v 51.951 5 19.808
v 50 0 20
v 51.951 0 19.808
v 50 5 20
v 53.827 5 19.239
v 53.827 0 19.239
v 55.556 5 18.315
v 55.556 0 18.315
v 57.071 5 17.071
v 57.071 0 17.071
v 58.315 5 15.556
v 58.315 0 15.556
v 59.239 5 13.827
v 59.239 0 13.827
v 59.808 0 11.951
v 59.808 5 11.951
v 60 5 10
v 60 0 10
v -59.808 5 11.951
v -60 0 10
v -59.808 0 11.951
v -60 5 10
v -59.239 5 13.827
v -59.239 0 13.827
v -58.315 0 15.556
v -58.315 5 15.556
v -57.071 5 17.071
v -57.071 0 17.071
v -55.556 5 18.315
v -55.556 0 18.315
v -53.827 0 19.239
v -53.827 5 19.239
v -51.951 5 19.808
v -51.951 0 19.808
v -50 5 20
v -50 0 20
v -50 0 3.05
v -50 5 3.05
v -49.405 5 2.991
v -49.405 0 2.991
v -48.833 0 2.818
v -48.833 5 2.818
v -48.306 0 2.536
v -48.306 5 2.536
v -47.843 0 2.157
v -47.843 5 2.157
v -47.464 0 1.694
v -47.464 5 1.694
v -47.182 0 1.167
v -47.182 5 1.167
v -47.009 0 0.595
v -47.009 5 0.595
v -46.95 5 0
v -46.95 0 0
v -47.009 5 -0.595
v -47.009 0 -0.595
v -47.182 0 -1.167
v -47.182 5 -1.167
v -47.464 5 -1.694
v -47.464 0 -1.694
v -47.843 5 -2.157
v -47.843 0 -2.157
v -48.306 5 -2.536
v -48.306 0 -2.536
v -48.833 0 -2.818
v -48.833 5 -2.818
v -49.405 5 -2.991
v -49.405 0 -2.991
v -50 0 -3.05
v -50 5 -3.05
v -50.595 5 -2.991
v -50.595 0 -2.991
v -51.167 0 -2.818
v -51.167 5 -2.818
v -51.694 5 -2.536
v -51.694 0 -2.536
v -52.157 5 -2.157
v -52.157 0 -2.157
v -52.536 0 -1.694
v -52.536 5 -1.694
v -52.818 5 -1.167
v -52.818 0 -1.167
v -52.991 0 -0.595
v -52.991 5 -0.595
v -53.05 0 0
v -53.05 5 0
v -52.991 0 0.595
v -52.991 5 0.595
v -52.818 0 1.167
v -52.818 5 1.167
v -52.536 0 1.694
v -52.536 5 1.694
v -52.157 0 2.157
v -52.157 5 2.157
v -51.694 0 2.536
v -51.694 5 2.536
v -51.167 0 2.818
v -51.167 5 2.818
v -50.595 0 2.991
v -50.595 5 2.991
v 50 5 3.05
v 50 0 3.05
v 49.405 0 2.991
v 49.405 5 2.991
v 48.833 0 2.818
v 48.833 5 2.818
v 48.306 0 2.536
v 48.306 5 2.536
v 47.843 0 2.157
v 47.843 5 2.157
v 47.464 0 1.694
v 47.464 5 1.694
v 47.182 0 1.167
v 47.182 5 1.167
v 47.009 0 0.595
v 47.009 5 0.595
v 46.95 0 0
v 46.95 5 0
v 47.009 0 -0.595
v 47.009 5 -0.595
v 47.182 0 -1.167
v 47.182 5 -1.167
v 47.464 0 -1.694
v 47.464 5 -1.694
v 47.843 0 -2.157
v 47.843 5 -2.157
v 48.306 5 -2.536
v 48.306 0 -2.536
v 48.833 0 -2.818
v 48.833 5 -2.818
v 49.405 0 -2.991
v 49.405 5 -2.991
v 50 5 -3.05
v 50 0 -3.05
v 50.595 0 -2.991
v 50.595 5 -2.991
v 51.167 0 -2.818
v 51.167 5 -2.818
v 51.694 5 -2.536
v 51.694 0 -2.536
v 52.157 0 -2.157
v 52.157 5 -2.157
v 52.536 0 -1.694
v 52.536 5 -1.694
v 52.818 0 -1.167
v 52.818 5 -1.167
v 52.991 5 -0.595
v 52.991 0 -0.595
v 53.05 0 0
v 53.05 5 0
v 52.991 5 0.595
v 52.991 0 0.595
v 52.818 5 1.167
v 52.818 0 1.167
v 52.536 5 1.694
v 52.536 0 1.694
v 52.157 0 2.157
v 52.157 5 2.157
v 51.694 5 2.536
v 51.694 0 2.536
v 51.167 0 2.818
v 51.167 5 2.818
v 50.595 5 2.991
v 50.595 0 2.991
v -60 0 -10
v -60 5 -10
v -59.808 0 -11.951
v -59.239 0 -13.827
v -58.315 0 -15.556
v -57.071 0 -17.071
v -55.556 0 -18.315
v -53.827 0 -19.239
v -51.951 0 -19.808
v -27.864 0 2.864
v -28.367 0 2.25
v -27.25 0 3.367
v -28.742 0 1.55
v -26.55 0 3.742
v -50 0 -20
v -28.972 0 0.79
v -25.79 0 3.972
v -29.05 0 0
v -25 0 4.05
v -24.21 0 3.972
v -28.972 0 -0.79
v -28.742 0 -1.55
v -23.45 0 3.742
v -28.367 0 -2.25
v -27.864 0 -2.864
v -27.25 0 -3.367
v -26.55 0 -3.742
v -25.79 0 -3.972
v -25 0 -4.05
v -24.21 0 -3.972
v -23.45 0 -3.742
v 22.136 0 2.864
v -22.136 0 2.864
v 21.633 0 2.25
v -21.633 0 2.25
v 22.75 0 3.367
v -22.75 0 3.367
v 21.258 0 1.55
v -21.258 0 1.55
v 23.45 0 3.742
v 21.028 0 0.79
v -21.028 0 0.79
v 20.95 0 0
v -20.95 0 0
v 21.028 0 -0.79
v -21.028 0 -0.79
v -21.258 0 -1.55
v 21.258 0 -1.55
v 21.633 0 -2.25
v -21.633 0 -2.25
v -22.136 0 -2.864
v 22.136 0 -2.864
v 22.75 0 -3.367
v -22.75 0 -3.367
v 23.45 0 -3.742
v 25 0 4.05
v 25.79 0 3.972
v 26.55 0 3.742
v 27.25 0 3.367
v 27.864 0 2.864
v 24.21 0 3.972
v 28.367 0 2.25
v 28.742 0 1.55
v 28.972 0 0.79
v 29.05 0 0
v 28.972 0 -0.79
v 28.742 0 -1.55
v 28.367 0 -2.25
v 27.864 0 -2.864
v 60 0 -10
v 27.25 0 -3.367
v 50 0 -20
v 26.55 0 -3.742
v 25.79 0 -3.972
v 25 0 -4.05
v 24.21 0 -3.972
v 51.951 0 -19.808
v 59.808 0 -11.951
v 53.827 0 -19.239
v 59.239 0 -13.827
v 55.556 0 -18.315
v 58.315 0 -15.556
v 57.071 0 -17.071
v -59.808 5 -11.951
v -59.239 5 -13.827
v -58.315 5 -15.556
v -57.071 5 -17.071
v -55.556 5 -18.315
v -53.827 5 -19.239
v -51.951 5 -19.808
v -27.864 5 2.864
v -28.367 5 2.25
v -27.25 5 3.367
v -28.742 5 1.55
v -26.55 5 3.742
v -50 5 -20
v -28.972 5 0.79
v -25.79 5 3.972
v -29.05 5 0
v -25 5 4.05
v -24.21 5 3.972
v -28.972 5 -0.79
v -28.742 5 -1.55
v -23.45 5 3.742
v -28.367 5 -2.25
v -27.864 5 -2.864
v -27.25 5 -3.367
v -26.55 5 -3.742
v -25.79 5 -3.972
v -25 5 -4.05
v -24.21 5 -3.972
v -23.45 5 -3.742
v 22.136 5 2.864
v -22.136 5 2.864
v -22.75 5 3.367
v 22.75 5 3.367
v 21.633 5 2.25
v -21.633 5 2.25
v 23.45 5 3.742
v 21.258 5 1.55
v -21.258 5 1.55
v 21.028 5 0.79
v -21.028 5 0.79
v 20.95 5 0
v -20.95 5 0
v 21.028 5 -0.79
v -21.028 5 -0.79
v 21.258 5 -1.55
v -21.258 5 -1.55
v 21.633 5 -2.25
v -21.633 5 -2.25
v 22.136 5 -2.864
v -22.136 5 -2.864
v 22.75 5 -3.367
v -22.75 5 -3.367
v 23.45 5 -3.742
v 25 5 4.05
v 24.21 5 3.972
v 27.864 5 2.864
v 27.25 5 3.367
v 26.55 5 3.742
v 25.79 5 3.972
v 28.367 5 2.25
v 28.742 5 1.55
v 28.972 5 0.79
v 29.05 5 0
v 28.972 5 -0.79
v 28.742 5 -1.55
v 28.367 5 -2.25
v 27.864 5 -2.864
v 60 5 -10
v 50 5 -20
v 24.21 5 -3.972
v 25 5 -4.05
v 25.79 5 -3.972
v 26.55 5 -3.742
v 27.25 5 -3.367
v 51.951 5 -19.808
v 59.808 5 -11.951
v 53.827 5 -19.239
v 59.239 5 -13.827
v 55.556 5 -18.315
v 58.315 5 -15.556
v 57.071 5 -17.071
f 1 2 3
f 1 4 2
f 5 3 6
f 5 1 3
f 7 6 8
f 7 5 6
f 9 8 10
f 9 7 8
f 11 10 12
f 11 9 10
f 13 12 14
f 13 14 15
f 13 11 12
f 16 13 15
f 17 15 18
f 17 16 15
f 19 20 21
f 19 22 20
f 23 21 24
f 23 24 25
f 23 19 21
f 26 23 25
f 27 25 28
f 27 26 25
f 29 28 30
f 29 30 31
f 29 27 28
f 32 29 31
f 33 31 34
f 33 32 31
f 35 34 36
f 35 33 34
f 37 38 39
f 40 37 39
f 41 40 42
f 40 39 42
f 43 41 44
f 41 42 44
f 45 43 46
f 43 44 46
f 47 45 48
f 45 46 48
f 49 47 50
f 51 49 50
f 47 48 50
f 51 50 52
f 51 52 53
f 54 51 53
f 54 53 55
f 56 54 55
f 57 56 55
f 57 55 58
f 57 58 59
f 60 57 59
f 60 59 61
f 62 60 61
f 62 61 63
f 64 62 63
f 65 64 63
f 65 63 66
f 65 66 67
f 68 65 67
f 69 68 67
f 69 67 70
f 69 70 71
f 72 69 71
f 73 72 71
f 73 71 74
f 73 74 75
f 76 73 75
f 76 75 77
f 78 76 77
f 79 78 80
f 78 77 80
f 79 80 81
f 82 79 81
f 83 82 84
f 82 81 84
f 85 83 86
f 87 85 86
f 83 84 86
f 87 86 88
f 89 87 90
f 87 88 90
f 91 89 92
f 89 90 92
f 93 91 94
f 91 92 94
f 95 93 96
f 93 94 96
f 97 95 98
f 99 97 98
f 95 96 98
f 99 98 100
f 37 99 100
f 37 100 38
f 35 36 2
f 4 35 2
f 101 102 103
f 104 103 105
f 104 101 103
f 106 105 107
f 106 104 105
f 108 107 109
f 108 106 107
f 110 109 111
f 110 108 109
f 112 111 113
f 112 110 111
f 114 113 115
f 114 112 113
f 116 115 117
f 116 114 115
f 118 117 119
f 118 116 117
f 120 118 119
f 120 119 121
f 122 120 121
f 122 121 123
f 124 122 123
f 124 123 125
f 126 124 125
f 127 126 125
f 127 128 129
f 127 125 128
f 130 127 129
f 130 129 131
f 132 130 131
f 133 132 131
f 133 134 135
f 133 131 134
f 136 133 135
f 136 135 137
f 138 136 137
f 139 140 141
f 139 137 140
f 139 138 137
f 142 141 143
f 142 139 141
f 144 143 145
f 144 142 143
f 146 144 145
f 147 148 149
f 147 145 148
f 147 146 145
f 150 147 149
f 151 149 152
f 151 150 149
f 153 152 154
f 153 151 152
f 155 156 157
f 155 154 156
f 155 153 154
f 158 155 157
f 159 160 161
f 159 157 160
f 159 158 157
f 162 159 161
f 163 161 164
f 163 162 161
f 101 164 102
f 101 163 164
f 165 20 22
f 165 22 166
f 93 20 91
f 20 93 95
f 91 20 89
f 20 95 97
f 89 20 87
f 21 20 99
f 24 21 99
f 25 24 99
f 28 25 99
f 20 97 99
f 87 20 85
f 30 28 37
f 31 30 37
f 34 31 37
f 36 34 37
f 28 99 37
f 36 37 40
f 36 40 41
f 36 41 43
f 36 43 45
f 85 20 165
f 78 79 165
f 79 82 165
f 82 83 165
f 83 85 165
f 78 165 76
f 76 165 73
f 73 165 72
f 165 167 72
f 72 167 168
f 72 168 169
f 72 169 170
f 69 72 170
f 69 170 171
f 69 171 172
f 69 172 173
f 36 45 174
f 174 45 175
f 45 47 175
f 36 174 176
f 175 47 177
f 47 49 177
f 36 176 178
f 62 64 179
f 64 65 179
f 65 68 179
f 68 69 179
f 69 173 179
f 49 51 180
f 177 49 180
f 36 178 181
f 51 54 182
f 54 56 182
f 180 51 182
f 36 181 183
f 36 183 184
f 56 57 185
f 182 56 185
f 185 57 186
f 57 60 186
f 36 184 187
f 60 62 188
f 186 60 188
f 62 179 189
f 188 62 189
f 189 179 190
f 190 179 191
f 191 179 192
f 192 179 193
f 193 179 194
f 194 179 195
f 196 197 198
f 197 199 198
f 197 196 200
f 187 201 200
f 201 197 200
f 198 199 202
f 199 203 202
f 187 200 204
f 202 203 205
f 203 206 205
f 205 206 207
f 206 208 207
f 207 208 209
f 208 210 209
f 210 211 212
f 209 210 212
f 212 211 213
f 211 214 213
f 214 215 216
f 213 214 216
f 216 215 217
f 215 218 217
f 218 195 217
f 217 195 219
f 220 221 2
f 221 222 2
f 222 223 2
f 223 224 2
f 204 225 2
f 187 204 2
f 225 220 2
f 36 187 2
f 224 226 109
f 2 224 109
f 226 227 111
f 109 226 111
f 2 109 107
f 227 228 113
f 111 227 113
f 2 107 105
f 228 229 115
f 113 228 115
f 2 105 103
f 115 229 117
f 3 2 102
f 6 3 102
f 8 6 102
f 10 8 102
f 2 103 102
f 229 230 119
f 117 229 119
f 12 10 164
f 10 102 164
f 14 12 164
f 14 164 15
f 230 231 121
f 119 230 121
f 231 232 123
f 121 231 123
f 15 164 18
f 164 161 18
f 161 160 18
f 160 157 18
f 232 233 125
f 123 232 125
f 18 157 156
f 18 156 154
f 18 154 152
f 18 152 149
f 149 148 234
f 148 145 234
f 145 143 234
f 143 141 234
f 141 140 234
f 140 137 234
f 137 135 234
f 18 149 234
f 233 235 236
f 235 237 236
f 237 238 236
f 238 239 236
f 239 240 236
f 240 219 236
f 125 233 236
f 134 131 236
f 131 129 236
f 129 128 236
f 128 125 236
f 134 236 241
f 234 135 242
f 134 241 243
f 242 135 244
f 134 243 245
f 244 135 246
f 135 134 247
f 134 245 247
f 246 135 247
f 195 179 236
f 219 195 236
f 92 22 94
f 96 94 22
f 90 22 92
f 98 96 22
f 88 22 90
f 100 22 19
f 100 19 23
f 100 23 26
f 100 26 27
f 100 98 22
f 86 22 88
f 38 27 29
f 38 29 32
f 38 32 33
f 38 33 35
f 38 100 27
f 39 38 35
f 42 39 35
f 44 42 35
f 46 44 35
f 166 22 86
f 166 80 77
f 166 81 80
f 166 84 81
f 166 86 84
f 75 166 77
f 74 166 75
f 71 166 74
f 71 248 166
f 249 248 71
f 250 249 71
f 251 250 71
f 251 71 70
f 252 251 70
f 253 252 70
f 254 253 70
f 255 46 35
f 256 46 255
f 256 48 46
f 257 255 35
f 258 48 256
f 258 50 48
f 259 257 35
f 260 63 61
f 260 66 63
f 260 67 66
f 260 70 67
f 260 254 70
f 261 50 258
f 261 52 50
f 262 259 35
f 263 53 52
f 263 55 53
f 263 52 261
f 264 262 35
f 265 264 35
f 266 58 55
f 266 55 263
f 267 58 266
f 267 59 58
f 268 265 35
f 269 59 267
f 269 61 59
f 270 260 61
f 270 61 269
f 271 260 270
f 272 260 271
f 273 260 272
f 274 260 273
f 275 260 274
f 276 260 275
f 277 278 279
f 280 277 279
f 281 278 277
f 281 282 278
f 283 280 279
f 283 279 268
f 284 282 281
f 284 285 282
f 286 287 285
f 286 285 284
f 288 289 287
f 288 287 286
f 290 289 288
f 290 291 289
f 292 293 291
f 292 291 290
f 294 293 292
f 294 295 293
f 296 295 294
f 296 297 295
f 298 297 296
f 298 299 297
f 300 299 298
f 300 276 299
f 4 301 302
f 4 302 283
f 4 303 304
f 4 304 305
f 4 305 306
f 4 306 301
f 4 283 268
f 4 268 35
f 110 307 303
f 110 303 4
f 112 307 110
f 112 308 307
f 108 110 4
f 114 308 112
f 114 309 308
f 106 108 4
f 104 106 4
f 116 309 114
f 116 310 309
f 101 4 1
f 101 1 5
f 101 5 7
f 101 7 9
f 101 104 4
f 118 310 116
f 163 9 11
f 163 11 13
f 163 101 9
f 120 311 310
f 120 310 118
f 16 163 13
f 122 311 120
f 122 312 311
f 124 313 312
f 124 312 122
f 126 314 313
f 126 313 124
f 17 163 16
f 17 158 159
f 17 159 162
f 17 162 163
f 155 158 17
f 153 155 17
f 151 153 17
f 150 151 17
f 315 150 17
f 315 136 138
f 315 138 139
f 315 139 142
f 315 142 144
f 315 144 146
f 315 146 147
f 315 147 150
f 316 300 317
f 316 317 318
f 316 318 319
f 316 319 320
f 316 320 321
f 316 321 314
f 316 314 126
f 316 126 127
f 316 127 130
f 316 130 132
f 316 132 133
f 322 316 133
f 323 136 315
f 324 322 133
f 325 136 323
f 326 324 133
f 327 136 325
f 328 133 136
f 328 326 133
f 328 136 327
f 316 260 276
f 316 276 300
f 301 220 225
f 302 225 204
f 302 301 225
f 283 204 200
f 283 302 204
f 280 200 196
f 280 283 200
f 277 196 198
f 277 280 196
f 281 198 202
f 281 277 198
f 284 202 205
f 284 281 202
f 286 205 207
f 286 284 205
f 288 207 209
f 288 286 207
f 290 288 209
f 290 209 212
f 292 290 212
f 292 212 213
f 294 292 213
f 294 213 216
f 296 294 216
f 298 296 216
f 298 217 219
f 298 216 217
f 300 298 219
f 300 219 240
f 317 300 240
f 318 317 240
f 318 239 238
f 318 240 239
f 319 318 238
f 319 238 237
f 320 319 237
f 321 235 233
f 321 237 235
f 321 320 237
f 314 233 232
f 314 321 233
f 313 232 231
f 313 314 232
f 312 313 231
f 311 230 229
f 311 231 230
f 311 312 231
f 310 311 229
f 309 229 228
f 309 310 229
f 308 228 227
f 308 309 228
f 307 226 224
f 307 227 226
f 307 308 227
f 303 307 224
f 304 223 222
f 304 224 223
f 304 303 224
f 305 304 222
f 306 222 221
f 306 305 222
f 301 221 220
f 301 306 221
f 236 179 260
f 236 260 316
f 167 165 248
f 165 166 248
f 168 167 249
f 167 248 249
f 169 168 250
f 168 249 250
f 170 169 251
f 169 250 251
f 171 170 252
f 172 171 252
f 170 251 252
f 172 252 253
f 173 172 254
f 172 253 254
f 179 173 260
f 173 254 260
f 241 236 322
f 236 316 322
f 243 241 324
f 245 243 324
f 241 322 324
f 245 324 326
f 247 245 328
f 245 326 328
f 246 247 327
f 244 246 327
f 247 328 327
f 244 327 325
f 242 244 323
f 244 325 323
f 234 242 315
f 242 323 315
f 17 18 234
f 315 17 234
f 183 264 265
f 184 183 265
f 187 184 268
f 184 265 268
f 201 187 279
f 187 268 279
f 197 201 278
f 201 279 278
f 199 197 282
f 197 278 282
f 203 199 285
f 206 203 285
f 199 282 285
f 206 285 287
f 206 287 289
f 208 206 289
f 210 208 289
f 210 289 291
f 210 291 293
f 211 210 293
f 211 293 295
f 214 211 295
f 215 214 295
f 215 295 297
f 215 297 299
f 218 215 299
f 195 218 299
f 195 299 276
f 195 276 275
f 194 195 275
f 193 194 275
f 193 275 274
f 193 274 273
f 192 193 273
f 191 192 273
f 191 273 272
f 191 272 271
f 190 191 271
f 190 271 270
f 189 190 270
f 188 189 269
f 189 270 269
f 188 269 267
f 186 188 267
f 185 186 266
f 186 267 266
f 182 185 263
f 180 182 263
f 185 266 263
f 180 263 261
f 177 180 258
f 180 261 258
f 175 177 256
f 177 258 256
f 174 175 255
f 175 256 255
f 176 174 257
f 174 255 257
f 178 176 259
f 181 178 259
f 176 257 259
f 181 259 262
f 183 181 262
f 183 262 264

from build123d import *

# Parameters (mm, degrees)
SKETCH1_W           = 120
SKETCH1_H           = 40
BOSS_EXTRUDE1_DEPTH = 5
SKETCH2_R           = 4.05
SKETCH2_R_2         = 3.05
CUT_EXTRUDE1_DEPTH  = 64.442887702
FILLET1_R           = 10


with BuildPart() as part:
    # Sketch1 → Boss-Extrude1 (new body)
    with BuildSketch(Plane(origin=(0, 0, 0), x_dir=(1, 0, 0), z_dir=(0, 1, 0))):
        Rectangle(SKETCH1_W, SKETCH1_H)
    extrude(amount=BOSS_EXTRUDE1_DEPTH)

    # Sketch2 → Cut-Extrude1 (cut, through all)
    with BuildSketch(Plane(origin=(0, 5, 0), x_dir=(1, 0, 0), z_dir=(0, 1, 0))):
        with Locations(Location((-25, 0, 0), (0, 0, 270))):
            Circle(SKETCH2_R)
        with Locations(Location((-50, 0, 0), (0, 0, 270))):
            Circle(SKETCH2_R_2)
    cut_extrude1 = extrude(amount=-CUT_EXTRUDE1_DEPTH, mode=Mode.SUBTRACT)

    # Mirror1: Cut-Extrude1 across plane
    add(cut_extrude1.mirror(Plane(origin=(0, 0, 0), x_dir=(0, 0, 1), z_dir=(1, 0, 0))), mode=Mode.SUBTRACT)

    # Fillet1
    fillet1_edges = [part.edges().sort_by_distance(p)[0] for p in [
        (60, 2.5, 20),
        (-60, 2.5, 20),
        (-60, 2.5, -20),
        (60, 2.5, -20),
    ]]
    fillet(fillet1_edges, radius=FILLET1_R)


solid = part.part
